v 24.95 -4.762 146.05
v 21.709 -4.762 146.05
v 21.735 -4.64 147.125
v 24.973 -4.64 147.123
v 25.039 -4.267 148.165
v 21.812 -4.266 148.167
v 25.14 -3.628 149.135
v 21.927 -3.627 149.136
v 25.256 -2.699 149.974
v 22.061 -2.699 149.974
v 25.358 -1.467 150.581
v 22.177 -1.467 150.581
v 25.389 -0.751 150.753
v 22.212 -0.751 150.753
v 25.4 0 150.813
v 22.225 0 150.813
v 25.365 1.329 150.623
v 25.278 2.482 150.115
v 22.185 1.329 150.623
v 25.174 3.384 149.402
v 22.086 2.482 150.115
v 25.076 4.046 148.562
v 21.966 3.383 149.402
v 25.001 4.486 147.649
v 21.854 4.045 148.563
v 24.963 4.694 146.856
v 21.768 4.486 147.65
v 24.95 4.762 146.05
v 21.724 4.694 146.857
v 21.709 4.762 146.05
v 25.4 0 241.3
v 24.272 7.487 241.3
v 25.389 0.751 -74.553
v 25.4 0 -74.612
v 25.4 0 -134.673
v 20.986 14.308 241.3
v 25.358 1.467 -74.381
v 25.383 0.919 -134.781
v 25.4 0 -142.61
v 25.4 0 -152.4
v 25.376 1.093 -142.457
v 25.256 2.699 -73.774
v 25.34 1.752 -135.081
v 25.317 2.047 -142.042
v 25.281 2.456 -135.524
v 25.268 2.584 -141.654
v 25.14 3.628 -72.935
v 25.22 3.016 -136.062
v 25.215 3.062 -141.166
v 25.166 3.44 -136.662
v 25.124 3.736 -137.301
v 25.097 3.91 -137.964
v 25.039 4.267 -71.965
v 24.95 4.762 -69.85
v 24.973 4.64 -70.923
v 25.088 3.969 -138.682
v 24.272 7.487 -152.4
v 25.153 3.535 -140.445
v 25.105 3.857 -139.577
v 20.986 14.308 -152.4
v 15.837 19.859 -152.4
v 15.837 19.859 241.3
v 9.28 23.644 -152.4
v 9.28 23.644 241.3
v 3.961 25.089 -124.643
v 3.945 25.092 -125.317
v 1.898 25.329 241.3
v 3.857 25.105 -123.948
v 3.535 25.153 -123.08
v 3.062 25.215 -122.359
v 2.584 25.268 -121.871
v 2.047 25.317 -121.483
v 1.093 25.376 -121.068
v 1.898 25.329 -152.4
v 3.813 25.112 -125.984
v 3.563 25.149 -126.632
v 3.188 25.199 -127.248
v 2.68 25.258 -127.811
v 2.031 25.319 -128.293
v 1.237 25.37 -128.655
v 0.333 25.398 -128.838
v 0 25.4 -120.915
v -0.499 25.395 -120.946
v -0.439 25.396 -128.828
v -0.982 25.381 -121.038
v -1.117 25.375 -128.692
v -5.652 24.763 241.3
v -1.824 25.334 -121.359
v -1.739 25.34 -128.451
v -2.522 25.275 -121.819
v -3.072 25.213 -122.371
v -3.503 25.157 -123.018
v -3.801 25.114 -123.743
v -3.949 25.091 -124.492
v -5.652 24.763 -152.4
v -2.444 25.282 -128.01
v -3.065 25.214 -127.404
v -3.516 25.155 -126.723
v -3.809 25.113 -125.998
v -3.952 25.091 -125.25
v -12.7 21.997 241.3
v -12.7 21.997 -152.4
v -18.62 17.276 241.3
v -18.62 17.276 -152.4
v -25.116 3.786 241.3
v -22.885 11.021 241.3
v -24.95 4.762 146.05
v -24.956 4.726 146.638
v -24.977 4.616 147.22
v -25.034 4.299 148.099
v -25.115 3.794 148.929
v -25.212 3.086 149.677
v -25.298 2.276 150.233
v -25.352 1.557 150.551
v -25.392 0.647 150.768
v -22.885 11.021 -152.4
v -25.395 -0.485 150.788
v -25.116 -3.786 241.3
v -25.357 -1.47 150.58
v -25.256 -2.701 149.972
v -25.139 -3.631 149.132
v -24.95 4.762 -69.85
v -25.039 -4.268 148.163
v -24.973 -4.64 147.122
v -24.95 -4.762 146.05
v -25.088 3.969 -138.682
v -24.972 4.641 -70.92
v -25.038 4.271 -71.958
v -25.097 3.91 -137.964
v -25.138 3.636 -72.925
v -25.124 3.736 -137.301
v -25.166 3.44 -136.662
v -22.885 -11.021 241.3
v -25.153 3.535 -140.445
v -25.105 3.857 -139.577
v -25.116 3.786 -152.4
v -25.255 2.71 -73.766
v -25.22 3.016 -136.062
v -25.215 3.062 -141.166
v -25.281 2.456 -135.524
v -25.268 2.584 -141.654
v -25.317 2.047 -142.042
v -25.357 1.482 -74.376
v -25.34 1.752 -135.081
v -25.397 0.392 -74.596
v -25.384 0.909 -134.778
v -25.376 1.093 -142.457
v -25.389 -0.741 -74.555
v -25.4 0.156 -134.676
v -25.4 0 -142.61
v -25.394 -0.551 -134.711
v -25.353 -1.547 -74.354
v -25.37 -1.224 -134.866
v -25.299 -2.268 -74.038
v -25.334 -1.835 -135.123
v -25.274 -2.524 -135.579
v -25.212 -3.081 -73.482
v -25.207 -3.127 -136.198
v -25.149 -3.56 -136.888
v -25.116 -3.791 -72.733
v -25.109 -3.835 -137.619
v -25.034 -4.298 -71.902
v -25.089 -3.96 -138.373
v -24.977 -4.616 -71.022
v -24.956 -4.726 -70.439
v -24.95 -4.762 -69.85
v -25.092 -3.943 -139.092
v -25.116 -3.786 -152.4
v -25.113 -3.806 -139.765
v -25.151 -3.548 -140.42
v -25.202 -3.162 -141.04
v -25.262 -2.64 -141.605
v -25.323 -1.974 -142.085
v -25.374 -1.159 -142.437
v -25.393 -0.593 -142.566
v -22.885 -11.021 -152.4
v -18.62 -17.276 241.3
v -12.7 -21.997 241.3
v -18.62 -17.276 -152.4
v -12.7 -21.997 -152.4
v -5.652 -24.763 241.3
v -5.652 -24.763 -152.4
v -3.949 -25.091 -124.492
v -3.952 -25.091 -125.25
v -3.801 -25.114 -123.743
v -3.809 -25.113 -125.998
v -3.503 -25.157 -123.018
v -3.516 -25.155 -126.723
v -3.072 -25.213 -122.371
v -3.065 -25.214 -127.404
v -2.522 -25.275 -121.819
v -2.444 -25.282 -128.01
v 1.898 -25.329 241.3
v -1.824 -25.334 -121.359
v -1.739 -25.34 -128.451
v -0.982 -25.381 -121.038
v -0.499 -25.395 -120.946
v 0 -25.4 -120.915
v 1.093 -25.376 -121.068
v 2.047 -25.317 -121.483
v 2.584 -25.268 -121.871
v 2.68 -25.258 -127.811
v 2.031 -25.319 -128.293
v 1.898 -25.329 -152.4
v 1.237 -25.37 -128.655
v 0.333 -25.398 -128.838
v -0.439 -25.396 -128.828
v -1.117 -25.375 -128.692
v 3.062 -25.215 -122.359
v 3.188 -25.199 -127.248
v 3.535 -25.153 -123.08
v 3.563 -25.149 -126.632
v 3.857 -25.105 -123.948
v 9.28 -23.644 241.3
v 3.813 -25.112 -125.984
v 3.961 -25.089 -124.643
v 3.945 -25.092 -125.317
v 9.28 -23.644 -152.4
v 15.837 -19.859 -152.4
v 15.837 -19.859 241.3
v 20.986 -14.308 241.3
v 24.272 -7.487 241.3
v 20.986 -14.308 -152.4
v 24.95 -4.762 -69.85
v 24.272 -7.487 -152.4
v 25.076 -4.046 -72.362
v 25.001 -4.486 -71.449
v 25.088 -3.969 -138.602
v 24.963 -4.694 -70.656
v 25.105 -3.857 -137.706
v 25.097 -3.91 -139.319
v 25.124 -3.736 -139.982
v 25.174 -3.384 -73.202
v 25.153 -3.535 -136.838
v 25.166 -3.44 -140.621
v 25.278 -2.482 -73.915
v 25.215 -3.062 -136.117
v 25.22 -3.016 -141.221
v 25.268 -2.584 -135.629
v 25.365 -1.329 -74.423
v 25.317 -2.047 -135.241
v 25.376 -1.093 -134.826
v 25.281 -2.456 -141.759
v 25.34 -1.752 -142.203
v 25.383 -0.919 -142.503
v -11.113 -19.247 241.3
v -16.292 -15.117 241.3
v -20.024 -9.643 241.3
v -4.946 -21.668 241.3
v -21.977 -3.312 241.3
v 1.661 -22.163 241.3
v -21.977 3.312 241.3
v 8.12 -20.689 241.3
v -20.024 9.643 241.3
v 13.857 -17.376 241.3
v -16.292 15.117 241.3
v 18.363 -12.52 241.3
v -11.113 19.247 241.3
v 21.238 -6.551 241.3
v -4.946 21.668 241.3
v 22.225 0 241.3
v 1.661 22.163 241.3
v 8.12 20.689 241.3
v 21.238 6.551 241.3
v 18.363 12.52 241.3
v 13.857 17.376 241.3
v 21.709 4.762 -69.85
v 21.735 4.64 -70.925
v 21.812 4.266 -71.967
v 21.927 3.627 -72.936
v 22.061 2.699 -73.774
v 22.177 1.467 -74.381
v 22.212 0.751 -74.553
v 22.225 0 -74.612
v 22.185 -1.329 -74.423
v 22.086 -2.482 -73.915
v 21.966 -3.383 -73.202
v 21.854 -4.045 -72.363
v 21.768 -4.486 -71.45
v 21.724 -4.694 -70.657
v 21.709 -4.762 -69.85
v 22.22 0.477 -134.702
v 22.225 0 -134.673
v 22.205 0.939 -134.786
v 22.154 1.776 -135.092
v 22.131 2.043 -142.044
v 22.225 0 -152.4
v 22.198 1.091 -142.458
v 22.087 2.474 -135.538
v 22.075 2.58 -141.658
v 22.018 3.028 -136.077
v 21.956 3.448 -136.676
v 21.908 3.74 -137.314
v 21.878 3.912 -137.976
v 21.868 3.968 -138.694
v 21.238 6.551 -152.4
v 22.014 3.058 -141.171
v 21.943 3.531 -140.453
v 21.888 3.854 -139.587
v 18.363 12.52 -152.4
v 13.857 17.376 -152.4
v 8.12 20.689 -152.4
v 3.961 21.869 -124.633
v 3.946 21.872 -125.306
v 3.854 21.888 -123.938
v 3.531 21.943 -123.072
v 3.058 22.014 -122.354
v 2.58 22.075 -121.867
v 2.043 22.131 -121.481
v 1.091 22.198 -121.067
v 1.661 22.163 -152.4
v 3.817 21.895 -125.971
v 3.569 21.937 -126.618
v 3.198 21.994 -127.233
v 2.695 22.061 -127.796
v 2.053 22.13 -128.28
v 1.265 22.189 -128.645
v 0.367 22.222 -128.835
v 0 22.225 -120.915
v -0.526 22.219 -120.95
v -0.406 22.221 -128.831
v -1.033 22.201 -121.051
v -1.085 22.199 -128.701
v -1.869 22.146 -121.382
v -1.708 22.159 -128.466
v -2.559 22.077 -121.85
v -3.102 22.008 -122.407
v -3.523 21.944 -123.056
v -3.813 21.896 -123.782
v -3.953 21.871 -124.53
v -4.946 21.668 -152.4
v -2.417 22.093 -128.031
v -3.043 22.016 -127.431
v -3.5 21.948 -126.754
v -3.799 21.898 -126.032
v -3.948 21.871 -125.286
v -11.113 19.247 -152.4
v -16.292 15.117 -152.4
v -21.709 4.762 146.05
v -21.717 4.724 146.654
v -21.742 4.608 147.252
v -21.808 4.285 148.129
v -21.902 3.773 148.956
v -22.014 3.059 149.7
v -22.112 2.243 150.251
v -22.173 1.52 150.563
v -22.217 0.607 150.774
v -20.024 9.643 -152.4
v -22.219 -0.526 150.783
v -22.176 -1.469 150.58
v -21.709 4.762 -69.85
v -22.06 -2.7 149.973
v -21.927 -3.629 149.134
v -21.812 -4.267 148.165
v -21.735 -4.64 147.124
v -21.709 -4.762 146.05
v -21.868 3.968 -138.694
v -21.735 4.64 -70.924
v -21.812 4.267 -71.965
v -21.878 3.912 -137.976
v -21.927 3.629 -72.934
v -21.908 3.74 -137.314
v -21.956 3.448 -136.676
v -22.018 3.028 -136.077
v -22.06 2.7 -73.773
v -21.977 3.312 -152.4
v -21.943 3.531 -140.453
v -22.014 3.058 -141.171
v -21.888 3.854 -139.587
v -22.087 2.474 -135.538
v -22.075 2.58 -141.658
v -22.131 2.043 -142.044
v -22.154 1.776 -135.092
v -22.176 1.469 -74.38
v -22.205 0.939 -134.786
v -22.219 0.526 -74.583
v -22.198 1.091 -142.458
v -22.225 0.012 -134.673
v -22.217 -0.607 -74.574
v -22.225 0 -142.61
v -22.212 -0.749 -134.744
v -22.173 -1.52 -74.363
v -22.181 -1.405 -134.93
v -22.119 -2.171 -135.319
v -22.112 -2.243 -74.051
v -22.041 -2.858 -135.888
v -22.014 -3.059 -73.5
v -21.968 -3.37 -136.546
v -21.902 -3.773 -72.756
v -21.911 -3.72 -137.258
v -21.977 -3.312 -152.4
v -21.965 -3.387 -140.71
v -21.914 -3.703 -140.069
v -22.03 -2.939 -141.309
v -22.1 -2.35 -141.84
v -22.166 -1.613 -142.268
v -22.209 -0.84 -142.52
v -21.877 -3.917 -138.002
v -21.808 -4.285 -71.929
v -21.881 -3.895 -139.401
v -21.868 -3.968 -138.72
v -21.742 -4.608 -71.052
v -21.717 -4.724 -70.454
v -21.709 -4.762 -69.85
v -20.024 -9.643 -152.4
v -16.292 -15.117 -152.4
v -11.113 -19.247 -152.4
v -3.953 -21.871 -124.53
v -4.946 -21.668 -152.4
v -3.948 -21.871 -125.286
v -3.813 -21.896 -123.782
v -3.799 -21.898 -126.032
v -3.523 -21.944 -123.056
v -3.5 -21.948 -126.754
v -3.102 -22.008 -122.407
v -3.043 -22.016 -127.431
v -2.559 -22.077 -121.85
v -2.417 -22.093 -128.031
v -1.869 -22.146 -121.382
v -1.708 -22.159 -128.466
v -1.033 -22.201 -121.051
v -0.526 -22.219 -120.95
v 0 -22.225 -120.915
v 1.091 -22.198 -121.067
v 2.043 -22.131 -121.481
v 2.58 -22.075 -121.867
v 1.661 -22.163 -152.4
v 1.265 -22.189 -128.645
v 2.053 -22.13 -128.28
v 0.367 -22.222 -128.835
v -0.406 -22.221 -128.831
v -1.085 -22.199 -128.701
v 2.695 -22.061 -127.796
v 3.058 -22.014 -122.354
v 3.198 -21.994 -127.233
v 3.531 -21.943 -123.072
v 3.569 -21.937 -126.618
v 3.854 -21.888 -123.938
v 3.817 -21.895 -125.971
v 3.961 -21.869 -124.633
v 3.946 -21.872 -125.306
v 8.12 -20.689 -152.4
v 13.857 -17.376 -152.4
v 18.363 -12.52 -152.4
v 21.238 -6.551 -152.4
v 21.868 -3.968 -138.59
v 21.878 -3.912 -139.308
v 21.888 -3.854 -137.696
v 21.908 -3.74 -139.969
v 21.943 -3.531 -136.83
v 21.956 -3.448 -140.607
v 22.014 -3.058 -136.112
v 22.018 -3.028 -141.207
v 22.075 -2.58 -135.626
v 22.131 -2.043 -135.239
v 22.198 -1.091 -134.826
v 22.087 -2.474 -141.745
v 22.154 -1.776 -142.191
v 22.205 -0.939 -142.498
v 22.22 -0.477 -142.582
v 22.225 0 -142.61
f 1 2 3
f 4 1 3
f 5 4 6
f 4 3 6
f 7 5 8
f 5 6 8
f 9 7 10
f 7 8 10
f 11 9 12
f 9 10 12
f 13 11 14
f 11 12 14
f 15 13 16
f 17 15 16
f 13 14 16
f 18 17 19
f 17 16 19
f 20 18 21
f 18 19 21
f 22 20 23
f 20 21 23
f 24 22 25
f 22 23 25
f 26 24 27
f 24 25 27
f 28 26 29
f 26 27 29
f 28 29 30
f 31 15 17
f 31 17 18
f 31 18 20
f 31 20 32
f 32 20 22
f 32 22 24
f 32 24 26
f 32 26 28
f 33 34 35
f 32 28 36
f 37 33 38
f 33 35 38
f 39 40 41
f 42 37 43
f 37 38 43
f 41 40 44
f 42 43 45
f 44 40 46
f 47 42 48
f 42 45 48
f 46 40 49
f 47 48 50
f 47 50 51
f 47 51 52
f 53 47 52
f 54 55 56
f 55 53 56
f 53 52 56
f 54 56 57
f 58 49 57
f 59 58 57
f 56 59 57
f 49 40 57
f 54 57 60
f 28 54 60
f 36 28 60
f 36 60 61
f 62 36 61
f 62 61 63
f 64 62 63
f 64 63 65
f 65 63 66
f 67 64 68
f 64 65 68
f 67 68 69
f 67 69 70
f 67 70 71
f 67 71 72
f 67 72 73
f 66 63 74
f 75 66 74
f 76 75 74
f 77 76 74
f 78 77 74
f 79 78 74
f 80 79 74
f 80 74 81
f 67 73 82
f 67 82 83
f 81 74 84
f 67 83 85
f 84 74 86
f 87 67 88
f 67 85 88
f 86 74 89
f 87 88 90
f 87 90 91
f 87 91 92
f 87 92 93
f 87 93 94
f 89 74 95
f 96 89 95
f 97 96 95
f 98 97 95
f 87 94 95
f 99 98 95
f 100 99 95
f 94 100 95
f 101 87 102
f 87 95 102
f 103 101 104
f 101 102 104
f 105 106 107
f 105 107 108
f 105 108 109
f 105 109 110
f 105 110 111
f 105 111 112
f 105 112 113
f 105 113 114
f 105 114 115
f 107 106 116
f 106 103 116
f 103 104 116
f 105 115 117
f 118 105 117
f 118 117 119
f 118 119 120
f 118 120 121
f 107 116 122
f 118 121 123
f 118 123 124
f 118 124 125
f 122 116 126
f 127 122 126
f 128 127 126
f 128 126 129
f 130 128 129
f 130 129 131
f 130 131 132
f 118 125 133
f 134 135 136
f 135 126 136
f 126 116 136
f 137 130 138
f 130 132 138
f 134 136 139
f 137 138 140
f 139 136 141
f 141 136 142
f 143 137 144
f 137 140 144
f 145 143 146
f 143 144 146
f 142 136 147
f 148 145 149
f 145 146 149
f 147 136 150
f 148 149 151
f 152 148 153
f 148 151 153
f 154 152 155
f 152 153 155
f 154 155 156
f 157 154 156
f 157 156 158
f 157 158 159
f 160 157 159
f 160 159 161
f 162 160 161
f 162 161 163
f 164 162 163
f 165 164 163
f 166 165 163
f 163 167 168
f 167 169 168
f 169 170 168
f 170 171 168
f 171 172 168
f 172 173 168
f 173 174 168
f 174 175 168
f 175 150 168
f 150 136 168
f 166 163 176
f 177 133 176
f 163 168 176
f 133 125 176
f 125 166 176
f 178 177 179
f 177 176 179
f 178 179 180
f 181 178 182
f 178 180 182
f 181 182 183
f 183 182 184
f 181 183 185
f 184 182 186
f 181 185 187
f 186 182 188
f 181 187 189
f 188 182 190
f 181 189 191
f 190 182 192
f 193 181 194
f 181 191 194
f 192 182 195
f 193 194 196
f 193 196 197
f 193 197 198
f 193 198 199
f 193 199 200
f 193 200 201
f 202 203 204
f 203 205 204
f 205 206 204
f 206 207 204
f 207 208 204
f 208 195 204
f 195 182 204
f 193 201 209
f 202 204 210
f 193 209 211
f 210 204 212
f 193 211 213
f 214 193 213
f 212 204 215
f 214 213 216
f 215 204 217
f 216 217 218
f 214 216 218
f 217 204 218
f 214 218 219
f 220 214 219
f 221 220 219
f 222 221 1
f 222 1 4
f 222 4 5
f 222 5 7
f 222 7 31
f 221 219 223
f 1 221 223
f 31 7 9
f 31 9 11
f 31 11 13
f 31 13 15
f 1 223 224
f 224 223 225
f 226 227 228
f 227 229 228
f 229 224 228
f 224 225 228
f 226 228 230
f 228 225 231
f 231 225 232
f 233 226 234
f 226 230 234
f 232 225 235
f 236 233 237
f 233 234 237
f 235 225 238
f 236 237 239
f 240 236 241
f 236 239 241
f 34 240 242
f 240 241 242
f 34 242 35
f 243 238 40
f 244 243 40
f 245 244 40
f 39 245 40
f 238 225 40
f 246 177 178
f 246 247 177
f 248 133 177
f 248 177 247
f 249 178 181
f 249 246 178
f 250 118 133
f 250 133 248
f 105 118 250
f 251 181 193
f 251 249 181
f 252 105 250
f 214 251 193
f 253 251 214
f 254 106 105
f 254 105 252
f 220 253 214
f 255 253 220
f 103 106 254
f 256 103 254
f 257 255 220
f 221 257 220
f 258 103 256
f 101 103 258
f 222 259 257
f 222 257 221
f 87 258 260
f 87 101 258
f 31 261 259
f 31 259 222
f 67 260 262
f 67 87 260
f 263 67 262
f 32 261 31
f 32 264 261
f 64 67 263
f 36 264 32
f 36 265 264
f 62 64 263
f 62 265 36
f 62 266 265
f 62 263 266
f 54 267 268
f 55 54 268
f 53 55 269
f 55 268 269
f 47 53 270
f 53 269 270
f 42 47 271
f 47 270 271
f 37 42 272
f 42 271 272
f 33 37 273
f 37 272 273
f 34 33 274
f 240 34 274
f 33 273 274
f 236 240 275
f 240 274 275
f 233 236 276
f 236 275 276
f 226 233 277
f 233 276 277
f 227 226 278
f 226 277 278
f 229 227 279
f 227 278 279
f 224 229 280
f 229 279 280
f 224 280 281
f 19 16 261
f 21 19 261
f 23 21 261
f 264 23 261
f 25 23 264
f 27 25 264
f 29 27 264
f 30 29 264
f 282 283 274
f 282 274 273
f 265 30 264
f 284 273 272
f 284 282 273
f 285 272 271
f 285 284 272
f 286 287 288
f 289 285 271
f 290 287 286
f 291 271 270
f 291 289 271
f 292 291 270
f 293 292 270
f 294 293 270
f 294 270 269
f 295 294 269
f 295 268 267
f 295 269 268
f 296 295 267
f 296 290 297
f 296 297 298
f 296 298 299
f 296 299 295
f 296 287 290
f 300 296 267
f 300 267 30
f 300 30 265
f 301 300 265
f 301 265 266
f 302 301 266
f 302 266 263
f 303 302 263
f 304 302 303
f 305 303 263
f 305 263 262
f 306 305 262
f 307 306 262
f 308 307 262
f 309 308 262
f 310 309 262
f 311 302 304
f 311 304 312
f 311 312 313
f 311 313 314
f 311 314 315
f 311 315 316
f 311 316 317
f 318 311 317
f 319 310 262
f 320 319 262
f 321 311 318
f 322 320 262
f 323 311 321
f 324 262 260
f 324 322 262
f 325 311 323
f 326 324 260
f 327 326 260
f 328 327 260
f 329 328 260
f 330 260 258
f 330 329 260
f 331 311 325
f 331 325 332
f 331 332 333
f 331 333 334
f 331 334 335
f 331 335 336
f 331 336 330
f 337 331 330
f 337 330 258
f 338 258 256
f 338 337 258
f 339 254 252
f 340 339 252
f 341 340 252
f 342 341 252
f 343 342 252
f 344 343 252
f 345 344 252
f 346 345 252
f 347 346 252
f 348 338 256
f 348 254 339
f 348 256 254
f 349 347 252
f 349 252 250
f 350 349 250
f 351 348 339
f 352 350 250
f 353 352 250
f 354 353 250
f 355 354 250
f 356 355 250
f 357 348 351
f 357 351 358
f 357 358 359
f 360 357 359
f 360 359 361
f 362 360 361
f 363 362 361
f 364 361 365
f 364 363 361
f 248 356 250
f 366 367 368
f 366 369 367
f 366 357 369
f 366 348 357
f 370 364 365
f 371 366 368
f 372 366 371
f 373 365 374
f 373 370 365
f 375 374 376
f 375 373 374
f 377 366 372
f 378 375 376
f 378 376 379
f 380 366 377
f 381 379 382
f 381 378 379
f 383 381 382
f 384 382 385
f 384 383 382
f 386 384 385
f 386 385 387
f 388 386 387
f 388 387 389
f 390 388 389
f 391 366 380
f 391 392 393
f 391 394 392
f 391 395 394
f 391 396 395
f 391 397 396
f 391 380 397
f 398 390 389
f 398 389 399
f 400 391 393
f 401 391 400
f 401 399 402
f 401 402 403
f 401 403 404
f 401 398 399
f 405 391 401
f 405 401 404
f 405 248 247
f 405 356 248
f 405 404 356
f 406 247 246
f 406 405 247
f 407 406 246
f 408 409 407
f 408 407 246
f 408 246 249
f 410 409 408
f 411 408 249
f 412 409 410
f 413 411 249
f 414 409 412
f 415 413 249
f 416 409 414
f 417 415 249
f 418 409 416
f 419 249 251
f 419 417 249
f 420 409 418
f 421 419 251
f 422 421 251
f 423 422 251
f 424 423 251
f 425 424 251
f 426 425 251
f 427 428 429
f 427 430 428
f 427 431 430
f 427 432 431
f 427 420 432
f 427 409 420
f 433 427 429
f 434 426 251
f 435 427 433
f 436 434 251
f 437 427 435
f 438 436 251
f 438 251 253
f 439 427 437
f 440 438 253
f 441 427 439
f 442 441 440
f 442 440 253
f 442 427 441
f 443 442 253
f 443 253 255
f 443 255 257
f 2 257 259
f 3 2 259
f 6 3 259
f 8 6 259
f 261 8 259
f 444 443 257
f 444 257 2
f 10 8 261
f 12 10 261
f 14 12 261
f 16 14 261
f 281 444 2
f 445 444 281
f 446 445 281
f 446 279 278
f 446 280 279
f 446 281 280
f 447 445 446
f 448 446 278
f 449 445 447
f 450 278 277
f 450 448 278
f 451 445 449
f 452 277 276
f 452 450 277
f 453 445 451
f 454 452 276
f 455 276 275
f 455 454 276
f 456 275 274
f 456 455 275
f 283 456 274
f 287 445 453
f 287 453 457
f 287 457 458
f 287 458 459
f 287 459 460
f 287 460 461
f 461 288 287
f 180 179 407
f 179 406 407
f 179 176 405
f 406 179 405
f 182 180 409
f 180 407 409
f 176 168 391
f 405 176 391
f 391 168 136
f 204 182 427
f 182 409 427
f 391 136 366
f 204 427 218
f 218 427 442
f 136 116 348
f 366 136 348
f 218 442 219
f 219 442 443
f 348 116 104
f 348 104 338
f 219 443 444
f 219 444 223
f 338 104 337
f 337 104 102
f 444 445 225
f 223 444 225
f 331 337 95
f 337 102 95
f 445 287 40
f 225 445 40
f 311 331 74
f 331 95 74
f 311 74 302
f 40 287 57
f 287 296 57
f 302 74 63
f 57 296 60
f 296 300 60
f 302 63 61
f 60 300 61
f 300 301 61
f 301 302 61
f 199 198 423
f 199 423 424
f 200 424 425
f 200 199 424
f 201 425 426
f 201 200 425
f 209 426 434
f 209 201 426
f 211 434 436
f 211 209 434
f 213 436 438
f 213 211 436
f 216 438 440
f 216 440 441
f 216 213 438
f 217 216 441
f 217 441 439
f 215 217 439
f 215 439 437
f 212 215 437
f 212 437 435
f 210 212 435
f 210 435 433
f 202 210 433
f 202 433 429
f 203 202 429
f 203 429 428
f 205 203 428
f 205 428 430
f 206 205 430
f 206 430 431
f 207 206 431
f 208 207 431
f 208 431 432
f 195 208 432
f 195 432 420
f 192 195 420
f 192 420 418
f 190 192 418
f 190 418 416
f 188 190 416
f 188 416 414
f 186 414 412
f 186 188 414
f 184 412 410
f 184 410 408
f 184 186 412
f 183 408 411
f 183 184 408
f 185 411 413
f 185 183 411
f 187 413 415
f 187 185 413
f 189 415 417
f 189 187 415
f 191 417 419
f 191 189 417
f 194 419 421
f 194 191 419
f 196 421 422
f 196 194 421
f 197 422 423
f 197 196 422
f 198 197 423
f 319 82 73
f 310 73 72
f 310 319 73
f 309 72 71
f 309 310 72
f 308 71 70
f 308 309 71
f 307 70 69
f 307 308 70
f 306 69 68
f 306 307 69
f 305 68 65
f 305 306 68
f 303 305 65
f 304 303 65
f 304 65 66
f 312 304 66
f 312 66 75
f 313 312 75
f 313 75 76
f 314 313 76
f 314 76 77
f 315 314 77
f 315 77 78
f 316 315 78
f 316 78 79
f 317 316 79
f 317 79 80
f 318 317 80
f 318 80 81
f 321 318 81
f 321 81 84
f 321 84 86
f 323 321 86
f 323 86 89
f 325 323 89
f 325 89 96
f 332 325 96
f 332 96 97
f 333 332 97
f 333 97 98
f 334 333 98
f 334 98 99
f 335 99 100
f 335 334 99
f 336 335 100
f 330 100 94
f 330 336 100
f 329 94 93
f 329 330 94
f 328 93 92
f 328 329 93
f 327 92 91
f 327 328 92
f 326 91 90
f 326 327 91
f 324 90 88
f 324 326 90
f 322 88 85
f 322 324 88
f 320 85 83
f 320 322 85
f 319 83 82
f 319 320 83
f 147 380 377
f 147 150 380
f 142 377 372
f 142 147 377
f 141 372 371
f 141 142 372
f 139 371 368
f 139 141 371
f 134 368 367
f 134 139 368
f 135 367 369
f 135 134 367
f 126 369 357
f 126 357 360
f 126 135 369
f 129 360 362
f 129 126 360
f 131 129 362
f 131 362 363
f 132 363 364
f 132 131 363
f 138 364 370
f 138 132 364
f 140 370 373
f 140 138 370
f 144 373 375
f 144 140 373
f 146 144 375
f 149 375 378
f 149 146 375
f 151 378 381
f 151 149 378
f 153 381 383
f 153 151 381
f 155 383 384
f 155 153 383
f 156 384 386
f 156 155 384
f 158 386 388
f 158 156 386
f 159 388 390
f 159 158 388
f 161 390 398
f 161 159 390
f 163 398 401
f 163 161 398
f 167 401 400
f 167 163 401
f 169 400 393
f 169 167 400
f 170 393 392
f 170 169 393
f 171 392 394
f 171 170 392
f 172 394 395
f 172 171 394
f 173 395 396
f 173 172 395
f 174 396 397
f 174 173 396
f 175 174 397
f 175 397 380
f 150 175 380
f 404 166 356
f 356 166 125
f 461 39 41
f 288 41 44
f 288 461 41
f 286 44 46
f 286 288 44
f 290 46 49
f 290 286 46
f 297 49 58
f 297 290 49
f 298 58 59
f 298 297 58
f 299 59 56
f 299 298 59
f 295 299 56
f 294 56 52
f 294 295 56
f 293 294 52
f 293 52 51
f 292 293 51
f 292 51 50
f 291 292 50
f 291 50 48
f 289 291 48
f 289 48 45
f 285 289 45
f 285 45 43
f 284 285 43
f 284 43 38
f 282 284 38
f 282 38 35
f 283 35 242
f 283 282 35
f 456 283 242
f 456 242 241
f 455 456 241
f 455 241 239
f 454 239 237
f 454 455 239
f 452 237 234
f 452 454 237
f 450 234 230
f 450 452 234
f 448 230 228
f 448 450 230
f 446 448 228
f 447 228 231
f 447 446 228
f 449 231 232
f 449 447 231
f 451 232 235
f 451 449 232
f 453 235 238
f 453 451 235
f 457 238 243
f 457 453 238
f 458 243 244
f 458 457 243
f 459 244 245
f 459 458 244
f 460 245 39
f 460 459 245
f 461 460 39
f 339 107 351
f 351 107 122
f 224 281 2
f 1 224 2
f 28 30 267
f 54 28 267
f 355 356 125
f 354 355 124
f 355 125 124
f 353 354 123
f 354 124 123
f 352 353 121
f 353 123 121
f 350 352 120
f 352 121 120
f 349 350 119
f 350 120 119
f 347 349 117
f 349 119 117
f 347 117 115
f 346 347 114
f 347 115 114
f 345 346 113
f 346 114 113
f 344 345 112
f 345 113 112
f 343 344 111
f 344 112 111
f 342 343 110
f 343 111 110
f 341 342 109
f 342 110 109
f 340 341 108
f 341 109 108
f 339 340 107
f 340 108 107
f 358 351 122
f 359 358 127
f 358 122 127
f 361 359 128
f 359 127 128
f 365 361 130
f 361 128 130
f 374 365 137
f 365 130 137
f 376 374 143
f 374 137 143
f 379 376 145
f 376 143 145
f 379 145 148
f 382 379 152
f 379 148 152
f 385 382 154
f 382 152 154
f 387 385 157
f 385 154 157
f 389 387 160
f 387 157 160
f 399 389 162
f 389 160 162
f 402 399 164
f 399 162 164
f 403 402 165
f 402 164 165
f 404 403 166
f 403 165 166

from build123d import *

# Parameters (mm, degrees)
BOSS_EXTRUDE2_DEPTH      = 152.4
BOSS_EXTRUDE2_DEPTH_BACK = 152.4
SKETCH3_R                = 25.4
SKETCH3_R_2              = 22.225
SKETCH9_R                = 25.4
SKETCH9_R_2              = 22.225
BOSS_EXTRUDE3_DEPTH      = 88.9
CUT_EXTRUDE2_DEPTH       = 244.959033446
CUT_EXTRUDE2_DEPTH_BACK  = 244.959033446
CUT_EXTRUDE3_DEPTH       = 244.959033566
CUT_EXTRUDE3_DEPTH_BACK  = 244.959033566
SKETCH6_R                = 3.96875
CUT_EXTRUDE4_DEPTH       = 244.959033566
CUT_EXTRUDE4_DEPTH_BACK  = 244.959033566
SKETCH8_R                = 3.96875


with BuildPart() as part:
    # Sketch3 → Boss-Extrude2 (new, two sides: drawn at the far end of the back side and taken through both)
    with BuildSketch(Plane.XY.offset(-BOSS_EXTRUDE2_DEPTH_BACK)):
        Circle(SKETCH3_R)
        Circle(SKETCH3_R_2, mode=Mode.SUBTRACT)
    extrude(amount=BOSS_EXTRUDE2_DEPTH + BOSS_EXTRUDE2_DEPTH_BACK)

    # Sketch9 → Boss-Extrude3 (add)
    with BuildSketch(Plane.XY.offset(152.4)):
        Circle(SKETCH9_R)
        Circle(SKETCH9_R_2, mode=Mode.SUBTRACT)
    extrude(amount=BOSS_EXTRUDE3_DEPTH)

    # Sketch5 → Cut-Extrude2 (cut, two sides: drawn at the far end of the back side and taken through both)
    with BuildSketch(Plane(origin=(0, 0, 0), x_dir=(0, 0, -1), z_dir=(1, 0, 0)).offset(-CUT_EXTRUDE2_DEPTH_BACK)):
        with BuildLine():
            Line((-146.05, 4.7625), (69.85, 4.7625))
            ThreePointArc((69.85, 4.7625), (74.6125, 0), (69.85, -4.7625))
            Line((69.85, -4.7625), (-146.05, -4.7625))
            ThreePointArc((-146.05, -4.7625), (-150.8125, 0), (-146.05, 4.7625))
        make_face()
    extrude(amount=CUT_EXTRUDE2_DEPTH + CUT_EXTRUDE2_DEPTH_BACK, mode=Mode.SUBTRACT)

    # Sketch6 → Cut-Extrude3 (cut, two sides: drawn at the far end of the back side and taken through both)
    with BuildSketch(Plane(origin=(0, 0, 0), x_dir=(0, 0, -1), z_dir=(1, 0, 0)).offset(-CUT_EXTRUDE3_DEPTH_BACK)):
        with Locations((138.641666667, 0)):
            Circle(SKETCH6_R)
    extrude(amount=CUT_EXTRUDE3_DEPTH + CUT_EXTRUDE3_DEPTH_BACK, mode=Mode.SUBTRACT)

    # Sketch8 → Cut-Extrude4 (cut, two sides: drawn at the far end of the back side and taken through both)
    with BuildSketch(Plane(origin=(0, 0, 0), x_dir=(1, 0, 0), z_dir=(0, 1, 0)).offset(-CUT_EXTRUDE4_DEPTH_BACK)):
        with Locations(Location((0, 124.883333333, 0), (0, 0, 270))):
            Circle(SKETCH8_R)
    extrude(amount=CUT_EXTRUDE4_DEPTH + CUT_EXTRUDE4_DEPTH_BACK, mode=Mode.SUBTRACT)


solid = part.part
